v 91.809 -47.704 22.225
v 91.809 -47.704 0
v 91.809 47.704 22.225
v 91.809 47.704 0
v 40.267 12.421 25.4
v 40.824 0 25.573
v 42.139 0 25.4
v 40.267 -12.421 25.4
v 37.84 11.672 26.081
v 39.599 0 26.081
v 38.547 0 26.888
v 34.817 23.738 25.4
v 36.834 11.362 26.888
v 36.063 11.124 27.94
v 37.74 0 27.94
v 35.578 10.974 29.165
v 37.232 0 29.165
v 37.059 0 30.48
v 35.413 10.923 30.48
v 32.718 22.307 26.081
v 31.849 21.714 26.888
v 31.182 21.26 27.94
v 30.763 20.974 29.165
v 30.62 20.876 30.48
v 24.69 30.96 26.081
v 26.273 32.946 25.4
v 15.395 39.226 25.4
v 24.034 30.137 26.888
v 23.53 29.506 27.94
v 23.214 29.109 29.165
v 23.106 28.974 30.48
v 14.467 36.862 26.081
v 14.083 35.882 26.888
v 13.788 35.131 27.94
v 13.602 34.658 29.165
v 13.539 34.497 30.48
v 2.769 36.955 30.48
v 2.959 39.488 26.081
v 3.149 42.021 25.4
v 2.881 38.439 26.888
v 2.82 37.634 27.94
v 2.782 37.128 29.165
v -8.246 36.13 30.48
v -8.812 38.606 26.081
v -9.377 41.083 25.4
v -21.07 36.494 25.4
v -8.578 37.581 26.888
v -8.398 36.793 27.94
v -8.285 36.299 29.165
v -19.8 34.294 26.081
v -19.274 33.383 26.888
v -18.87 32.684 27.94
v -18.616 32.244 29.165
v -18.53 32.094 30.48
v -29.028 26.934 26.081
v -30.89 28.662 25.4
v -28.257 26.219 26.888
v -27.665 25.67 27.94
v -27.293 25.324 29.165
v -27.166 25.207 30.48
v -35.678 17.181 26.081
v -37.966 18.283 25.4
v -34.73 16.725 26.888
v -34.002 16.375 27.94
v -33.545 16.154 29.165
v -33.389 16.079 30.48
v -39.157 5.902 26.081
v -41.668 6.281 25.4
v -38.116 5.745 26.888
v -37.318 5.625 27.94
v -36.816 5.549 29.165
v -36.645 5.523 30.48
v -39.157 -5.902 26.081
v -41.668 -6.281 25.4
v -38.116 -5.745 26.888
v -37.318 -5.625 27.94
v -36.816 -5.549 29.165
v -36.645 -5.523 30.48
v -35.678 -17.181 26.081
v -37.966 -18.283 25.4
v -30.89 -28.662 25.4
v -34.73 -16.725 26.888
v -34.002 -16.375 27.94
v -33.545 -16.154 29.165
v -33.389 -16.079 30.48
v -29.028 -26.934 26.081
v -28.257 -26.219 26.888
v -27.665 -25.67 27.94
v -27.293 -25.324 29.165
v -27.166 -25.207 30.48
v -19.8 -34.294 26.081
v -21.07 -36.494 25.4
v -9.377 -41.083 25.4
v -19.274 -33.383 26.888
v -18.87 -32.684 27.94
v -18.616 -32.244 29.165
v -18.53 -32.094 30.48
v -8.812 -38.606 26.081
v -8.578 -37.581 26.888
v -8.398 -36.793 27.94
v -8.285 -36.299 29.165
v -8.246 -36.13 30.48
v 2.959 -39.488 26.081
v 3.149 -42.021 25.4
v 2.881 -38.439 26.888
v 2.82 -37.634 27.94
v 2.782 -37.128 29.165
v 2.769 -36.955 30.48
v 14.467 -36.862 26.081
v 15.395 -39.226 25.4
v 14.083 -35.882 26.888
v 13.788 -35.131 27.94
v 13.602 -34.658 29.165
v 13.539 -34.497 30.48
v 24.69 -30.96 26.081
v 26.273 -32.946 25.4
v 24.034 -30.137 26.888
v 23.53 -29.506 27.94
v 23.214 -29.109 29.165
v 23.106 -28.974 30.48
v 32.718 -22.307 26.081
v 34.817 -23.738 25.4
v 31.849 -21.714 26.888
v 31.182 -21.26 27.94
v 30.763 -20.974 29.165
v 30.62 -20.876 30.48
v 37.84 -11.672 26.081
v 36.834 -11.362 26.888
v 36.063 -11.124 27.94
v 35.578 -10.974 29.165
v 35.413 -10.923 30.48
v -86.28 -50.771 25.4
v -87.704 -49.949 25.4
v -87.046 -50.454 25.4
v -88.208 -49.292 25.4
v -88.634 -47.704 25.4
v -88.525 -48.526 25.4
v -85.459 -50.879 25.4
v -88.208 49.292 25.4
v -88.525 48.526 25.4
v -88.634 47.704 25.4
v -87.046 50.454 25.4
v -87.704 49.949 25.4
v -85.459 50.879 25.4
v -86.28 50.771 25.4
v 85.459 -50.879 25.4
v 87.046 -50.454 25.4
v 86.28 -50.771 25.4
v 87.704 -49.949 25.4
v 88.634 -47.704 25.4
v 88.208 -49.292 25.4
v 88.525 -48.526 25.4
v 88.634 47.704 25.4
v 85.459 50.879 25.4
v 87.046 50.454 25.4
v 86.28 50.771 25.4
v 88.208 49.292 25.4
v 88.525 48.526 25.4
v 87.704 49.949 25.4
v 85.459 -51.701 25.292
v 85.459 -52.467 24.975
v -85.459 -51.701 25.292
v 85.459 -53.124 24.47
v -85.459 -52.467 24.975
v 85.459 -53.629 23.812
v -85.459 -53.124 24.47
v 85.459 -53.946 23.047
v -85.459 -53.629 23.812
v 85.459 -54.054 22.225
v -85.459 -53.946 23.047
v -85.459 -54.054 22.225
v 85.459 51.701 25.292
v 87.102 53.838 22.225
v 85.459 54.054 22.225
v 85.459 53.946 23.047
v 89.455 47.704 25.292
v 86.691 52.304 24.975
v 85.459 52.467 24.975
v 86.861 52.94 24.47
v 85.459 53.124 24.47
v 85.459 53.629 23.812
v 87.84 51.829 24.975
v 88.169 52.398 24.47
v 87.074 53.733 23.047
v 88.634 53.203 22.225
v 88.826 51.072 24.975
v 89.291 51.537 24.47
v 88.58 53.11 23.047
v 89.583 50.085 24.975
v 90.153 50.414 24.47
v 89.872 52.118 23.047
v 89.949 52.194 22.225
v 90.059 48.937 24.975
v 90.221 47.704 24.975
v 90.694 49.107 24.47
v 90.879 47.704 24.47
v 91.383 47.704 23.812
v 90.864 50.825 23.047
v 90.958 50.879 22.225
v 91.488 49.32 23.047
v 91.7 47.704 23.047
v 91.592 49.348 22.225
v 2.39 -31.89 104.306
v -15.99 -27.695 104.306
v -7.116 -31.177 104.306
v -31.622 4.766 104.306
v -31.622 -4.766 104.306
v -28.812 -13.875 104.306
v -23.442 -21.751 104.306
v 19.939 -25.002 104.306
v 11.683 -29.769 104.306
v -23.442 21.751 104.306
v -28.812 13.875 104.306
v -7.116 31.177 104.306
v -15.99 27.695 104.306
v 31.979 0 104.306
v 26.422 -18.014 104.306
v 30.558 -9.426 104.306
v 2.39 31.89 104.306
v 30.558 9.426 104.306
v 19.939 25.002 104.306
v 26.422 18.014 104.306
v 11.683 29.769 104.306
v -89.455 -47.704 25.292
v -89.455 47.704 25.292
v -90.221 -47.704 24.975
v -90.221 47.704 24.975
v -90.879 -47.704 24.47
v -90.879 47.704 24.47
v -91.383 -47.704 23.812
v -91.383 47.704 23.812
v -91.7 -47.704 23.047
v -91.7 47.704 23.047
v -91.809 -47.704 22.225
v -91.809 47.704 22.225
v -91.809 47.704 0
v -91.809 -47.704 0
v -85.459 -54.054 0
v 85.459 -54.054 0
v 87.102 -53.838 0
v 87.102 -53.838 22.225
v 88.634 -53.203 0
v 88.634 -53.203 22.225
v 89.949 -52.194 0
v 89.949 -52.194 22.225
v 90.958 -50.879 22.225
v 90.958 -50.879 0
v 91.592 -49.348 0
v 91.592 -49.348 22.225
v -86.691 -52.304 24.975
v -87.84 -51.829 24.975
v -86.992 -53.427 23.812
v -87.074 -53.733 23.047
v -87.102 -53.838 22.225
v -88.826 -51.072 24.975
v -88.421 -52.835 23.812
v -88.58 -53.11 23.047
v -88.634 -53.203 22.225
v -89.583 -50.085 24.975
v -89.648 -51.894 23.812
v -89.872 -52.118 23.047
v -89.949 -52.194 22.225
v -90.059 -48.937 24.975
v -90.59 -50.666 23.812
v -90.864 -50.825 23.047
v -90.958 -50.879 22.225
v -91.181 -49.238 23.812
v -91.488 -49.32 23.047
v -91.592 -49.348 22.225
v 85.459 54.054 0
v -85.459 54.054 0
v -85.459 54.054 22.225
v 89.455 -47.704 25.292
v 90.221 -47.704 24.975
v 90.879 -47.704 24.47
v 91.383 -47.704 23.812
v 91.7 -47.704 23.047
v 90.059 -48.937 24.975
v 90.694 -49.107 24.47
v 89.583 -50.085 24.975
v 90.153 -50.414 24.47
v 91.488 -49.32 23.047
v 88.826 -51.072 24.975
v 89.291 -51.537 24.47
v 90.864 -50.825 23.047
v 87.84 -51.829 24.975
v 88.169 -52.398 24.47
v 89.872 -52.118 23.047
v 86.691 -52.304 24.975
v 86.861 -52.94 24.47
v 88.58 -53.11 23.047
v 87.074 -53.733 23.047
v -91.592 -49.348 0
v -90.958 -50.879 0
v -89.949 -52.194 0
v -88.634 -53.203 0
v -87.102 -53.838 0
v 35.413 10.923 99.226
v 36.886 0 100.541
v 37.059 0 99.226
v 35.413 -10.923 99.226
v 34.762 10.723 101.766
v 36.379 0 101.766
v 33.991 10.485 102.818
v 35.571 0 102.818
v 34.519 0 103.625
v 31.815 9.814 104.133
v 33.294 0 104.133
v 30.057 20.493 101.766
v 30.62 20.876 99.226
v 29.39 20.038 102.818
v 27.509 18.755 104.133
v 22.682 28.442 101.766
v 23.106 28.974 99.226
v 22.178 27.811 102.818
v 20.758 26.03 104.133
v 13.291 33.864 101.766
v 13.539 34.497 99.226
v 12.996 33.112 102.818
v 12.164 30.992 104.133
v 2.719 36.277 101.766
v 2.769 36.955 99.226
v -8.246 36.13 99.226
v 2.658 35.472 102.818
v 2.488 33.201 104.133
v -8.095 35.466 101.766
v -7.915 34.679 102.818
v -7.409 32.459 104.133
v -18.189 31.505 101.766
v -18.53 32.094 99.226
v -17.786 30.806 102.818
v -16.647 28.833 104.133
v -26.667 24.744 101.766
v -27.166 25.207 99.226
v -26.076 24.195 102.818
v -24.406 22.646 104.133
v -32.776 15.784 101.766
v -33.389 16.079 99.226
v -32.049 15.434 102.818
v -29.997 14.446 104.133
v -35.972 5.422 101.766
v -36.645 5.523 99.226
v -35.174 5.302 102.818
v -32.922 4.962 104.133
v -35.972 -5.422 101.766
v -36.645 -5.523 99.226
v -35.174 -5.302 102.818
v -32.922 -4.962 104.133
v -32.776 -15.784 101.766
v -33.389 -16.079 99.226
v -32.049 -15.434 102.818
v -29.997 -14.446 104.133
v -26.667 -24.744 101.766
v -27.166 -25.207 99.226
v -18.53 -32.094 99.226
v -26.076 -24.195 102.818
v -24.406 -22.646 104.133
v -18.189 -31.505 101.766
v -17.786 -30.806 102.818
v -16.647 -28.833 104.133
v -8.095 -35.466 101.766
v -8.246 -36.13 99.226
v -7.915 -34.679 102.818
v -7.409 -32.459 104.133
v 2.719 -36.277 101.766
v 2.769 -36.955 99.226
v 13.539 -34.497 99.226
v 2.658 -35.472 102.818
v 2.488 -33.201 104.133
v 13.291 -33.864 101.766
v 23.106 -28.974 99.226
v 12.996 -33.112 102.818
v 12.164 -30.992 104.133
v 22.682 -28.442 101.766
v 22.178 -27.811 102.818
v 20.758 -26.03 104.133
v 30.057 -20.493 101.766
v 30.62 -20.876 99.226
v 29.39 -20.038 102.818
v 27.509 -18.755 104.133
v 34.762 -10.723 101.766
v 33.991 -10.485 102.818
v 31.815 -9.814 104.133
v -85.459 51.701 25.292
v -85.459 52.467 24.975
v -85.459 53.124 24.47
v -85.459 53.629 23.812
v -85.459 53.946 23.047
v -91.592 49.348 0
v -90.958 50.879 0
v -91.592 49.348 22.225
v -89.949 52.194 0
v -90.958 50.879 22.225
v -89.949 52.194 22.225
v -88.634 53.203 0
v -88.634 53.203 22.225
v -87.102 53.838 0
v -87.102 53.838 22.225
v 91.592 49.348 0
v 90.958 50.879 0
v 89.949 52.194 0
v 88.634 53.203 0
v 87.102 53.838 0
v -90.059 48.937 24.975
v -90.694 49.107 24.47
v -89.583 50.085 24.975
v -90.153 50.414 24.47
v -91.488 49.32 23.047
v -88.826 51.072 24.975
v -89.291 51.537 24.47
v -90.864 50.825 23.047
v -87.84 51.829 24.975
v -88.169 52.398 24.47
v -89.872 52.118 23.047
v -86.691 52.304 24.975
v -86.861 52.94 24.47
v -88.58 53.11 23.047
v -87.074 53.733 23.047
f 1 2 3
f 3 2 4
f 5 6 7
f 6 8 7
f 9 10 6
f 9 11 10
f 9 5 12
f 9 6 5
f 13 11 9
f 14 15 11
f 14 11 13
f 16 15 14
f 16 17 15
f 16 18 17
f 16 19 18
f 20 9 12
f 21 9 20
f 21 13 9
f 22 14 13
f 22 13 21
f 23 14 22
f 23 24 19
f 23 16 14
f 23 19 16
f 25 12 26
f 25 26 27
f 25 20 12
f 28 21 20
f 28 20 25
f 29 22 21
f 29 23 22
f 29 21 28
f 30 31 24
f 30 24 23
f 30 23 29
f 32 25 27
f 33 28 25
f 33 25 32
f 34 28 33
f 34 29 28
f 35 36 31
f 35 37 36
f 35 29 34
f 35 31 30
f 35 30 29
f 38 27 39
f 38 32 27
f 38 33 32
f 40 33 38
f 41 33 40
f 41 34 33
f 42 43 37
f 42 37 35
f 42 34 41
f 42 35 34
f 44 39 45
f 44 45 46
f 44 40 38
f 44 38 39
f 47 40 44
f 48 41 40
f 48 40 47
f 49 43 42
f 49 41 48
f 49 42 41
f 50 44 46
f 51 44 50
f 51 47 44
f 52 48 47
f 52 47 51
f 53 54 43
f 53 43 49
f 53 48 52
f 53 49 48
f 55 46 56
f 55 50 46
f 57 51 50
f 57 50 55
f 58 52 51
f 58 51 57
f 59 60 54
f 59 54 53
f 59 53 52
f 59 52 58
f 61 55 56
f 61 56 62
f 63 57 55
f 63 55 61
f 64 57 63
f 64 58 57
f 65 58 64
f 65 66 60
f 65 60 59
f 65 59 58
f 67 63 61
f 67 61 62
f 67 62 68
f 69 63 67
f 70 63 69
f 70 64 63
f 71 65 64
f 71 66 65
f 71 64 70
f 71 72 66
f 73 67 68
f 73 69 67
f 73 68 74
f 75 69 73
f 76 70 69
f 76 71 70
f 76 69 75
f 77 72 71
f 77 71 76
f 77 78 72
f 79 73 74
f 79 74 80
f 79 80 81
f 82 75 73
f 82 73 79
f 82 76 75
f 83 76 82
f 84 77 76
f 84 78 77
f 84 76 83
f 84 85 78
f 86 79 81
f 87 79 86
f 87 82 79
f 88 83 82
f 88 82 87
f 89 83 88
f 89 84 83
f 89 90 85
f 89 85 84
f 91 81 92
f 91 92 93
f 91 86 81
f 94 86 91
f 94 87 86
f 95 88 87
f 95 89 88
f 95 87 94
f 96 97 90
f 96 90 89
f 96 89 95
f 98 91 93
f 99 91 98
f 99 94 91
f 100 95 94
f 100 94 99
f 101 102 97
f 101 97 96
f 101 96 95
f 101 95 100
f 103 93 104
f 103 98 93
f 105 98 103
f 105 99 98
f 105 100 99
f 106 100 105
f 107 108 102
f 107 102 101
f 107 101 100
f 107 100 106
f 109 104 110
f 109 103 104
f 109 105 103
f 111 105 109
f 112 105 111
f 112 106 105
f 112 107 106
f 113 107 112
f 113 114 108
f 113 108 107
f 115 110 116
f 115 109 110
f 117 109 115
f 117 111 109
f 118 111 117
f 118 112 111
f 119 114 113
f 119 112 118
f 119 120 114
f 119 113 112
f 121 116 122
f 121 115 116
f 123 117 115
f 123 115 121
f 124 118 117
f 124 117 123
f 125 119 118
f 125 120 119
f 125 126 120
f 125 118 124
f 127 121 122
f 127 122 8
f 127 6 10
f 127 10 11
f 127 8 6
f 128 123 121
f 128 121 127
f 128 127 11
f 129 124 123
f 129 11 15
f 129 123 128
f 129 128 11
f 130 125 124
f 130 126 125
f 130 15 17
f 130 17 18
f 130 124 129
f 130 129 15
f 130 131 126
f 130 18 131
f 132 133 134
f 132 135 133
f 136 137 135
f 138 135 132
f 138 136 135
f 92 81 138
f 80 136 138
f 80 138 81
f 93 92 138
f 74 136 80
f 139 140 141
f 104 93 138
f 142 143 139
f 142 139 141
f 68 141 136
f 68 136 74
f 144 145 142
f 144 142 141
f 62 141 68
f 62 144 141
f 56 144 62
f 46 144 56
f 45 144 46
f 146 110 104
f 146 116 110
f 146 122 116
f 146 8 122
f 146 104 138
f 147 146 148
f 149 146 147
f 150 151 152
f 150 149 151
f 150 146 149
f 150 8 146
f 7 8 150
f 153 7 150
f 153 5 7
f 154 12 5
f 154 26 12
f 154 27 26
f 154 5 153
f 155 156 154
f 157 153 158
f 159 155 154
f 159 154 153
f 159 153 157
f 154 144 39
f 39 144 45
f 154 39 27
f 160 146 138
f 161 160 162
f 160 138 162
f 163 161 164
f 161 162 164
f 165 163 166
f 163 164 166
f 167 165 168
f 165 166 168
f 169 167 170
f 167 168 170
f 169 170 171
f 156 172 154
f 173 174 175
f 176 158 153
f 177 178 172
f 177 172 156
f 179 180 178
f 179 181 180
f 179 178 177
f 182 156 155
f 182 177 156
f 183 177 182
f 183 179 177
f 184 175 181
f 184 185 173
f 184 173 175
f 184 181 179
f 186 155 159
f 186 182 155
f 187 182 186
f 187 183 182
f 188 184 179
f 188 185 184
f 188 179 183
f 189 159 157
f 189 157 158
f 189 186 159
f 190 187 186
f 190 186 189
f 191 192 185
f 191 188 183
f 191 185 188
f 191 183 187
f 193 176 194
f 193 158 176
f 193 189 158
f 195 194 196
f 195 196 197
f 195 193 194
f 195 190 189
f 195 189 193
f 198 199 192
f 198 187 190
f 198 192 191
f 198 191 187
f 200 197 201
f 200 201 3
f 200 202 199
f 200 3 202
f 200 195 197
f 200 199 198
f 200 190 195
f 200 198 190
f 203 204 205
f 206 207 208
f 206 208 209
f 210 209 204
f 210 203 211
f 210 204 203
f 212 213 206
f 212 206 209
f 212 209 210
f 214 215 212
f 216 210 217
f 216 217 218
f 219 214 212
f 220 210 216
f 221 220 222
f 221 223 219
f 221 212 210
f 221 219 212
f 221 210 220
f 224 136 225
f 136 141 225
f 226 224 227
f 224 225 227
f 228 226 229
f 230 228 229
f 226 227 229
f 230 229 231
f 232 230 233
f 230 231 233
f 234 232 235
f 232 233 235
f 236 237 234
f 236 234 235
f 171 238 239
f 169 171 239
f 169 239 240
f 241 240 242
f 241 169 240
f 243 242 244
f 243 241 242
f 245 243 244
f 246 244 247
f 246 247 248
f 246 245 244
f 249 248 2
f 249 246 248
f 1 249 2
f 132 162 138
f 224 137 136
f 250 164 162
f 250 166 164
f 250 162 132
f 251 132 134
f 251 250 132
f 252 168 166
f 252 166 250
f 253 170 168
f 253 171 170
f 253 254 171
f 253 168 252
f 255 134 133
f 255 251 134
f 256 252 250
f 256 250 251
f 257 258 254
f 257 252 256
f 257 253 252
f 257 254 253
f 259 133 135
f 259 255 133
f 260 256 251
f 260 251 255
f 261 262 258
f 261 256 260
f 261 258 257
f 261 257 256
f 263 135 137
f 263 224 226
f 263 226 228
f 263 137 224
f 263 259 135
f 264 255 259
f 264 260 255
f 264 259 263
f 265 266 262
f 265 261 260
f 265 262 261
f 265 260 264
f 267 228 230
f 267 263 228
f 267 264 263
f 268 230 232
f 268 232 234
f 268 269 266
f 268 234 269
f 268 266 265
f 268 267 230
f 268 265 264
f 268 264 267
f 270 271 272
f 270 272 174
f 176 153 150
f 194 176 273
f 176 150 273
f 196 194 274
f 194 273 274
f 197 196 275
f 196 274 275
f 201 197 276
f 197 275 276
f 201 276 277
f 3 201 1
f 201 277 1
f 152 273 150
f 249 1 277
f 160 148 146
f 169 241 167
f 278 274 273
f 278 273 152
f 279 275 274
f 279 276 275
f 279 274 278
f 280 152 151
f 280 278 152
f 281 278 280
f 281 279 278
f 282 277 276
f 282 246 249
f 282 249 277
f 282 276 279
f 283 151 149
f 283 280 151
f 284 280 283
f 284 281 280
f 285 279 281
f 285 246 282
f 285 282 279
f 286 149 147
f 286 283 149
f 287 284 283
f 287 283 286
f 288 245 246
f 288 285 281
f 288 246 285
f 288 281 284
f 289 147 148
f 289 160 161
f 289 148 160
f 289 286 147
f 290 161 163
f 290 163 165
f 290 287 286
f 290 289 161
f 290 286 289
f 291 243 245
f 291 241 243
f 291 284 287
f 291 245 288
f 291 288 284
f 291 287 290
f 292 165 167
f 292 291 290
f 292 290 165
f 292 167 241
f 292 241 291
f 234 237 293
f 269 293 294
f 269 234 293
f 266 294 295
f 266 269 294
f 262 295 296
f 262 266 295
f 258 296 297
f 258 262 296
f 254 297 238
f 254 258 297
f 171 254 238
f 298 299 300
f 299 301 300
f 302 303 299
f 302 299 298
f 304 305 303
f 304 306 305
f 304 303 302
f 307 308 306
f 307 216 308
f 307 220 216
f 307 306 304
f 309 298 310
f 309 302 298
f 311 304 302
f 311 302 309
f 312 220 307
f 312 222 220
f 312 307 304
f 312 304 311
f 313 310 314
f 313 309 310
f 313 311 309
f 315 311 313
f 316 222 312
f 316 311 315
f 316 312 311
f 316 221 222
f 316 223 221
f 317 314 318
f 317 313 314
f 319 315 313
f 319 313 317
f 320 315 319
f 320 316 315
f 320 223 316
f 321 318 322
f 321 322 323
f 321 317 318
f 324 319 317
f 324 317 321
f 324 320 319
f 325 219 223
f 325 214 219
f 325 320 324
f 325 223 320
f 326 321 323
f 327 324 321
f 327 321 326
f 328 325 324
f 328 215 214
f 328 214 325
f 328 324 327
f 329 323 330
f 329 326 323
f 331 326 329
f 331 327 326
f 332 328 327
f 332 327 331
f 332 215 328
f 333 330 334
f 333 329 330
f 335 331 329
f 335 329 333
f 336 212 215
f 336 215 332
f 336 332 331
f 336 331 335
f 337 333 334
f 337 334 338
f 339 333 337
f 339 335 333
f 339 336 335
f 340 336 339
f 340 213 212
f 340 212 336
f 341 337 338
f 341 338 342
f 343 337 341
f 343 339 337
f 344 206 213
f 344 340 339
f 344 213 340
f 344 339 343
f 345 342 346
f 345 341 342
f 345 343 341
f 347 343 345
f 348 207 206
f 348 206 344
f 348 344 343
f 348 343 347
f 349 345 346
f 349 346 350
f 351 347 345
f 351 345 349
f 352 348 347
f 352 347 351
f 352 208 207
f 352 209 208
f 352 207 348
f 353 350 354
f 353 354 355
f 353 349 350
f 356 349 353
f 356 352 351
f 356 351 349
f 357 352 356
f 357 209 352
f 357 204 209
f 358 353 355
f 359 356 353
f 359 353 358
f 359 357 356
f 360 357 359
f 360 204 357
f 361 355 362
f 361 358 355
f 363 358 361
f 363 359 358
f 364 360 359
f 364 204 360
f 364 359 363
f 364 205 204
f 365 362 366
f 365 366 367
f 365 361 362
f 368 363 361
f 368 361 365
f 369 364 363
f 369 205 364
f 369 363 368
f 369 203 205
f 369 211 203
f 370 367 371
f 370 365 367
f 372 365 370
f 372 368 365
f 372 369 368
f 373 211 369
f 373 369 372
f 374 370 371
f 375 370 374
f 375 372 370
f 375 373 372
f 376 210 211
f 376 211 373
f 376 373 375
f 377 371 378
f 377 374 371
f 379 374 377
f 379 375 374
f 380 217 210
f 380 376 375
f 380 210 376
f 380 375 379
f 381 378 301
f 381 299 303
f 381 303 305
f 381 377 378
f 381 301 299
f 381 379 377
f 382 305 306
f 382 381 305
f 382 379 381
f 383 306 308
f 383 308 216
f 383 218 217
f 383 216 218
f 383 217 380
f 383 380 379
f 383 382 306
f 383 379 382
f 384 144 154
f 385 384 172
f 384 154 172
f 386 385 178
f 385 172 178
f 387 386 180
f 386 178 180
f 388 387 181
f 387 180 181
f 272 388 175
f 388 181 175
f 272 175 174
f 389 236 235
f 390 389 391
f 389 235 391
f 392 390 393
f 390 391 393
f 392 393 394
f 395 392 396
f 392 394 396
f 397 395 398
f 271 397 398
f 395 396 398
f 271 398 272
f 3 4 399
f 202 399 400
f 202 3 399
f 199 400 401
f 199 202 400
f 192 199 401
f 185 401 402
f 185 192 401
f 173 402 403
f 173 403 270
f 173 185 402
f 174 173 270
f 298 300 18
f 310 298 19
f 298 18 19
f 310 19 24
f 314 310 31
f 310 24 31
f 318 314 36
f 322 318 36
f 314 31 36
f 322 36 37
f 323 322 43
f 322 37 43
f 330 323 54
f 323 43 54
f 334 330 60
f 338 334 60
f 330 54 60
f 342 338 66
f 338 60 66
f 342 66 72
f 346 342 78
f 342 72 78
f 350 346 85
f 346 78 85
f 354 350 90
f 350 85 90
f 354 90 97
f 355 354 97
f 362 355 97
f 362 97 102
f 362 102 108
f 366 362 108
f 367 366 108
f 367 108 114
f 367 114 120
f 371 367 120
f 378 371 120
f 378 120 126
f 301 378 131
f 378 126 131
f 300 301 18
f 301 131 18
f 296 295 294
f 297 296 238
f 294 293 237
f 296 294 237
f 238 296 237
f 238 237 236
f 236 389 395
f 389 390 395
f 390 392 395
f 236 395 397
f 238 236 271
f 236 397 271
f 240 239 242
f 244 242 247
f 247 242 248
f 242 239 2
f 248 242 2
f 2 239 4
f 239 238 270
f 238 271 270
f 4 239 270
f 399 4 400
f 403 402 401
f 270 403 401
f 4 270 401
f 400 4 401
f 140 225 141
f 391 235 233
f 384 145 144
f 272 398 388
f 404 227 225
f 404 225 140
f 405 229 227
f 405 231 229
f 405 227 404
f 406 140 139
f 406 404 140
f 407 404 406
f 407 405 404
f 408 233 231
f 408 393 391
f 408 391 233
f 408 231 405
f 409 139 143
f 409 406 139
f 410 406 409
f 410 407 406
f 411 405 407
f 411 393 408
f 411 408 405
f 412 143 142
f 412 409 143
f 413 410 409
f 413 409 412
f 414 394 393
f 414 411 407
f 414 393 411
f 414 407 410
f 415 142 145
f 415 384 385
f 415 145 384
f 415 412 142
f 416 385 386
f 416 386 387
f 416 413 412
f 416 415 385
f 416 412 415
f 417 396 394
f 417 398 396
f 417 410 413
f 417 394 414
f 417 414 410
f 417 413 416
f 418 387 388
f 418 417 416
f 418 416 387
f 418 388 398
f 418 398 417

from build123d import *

# Parameters (mm, degrees)
F0_W     = 183.617264
F0_H     = 108.108356
F1_DEPTH = 25.4
F2_R     = 6.35
F3_R     = 37.05912
F4_DEPTH = 78.90592
F5_R     = 5.08
F6_R     = 3.175


with BuildPart() as f1:
    # F0 (on Top) → F1 (new body)
    with BuildSketch(Plane.XY):
        Rectangle(F0_W, F0_H)
    extrude(amount=F1_DEPTH)

    # F2
    f2_edges = [f1.edges().sort_by_distance(p)[0] for p in [
        (-91.808632, -54.054178, 12.7),
        (91.808632, -54.054178, 12.7),
        (91.808632, 54.054178, 12.7),
        (-91.808632, 54.054178, 12.7),
    ]]
    fillet(f2_edges, radius=F2_R)

    # F3 (on face) → F4 (join)
    with BuildSketch(Plane.XY.offset(25.4)):
        Circle(F3_R)
    extrude(amount=F4_DEPTH)

    # F5
    f5_edges = [f1.edges().sort_by_distance(p)[0] for p in [
        (37.05912, 0, 64.85296),
        (-37.05912, 0, 25.4),
        (-37.05912, 0, 104.30592),
    ]]
    fillet(f5_edges, radius=F5_R)

    # F6
    f6_edges = [f1.edges().sort_by_distance(p)[0] for p in [
        (-31.97912, 0, 104.30592),
        (-91.808632, 0, 25.4),
    ]]
    fillet(f6_edges, radius=F6_R)


solid = f1.part
